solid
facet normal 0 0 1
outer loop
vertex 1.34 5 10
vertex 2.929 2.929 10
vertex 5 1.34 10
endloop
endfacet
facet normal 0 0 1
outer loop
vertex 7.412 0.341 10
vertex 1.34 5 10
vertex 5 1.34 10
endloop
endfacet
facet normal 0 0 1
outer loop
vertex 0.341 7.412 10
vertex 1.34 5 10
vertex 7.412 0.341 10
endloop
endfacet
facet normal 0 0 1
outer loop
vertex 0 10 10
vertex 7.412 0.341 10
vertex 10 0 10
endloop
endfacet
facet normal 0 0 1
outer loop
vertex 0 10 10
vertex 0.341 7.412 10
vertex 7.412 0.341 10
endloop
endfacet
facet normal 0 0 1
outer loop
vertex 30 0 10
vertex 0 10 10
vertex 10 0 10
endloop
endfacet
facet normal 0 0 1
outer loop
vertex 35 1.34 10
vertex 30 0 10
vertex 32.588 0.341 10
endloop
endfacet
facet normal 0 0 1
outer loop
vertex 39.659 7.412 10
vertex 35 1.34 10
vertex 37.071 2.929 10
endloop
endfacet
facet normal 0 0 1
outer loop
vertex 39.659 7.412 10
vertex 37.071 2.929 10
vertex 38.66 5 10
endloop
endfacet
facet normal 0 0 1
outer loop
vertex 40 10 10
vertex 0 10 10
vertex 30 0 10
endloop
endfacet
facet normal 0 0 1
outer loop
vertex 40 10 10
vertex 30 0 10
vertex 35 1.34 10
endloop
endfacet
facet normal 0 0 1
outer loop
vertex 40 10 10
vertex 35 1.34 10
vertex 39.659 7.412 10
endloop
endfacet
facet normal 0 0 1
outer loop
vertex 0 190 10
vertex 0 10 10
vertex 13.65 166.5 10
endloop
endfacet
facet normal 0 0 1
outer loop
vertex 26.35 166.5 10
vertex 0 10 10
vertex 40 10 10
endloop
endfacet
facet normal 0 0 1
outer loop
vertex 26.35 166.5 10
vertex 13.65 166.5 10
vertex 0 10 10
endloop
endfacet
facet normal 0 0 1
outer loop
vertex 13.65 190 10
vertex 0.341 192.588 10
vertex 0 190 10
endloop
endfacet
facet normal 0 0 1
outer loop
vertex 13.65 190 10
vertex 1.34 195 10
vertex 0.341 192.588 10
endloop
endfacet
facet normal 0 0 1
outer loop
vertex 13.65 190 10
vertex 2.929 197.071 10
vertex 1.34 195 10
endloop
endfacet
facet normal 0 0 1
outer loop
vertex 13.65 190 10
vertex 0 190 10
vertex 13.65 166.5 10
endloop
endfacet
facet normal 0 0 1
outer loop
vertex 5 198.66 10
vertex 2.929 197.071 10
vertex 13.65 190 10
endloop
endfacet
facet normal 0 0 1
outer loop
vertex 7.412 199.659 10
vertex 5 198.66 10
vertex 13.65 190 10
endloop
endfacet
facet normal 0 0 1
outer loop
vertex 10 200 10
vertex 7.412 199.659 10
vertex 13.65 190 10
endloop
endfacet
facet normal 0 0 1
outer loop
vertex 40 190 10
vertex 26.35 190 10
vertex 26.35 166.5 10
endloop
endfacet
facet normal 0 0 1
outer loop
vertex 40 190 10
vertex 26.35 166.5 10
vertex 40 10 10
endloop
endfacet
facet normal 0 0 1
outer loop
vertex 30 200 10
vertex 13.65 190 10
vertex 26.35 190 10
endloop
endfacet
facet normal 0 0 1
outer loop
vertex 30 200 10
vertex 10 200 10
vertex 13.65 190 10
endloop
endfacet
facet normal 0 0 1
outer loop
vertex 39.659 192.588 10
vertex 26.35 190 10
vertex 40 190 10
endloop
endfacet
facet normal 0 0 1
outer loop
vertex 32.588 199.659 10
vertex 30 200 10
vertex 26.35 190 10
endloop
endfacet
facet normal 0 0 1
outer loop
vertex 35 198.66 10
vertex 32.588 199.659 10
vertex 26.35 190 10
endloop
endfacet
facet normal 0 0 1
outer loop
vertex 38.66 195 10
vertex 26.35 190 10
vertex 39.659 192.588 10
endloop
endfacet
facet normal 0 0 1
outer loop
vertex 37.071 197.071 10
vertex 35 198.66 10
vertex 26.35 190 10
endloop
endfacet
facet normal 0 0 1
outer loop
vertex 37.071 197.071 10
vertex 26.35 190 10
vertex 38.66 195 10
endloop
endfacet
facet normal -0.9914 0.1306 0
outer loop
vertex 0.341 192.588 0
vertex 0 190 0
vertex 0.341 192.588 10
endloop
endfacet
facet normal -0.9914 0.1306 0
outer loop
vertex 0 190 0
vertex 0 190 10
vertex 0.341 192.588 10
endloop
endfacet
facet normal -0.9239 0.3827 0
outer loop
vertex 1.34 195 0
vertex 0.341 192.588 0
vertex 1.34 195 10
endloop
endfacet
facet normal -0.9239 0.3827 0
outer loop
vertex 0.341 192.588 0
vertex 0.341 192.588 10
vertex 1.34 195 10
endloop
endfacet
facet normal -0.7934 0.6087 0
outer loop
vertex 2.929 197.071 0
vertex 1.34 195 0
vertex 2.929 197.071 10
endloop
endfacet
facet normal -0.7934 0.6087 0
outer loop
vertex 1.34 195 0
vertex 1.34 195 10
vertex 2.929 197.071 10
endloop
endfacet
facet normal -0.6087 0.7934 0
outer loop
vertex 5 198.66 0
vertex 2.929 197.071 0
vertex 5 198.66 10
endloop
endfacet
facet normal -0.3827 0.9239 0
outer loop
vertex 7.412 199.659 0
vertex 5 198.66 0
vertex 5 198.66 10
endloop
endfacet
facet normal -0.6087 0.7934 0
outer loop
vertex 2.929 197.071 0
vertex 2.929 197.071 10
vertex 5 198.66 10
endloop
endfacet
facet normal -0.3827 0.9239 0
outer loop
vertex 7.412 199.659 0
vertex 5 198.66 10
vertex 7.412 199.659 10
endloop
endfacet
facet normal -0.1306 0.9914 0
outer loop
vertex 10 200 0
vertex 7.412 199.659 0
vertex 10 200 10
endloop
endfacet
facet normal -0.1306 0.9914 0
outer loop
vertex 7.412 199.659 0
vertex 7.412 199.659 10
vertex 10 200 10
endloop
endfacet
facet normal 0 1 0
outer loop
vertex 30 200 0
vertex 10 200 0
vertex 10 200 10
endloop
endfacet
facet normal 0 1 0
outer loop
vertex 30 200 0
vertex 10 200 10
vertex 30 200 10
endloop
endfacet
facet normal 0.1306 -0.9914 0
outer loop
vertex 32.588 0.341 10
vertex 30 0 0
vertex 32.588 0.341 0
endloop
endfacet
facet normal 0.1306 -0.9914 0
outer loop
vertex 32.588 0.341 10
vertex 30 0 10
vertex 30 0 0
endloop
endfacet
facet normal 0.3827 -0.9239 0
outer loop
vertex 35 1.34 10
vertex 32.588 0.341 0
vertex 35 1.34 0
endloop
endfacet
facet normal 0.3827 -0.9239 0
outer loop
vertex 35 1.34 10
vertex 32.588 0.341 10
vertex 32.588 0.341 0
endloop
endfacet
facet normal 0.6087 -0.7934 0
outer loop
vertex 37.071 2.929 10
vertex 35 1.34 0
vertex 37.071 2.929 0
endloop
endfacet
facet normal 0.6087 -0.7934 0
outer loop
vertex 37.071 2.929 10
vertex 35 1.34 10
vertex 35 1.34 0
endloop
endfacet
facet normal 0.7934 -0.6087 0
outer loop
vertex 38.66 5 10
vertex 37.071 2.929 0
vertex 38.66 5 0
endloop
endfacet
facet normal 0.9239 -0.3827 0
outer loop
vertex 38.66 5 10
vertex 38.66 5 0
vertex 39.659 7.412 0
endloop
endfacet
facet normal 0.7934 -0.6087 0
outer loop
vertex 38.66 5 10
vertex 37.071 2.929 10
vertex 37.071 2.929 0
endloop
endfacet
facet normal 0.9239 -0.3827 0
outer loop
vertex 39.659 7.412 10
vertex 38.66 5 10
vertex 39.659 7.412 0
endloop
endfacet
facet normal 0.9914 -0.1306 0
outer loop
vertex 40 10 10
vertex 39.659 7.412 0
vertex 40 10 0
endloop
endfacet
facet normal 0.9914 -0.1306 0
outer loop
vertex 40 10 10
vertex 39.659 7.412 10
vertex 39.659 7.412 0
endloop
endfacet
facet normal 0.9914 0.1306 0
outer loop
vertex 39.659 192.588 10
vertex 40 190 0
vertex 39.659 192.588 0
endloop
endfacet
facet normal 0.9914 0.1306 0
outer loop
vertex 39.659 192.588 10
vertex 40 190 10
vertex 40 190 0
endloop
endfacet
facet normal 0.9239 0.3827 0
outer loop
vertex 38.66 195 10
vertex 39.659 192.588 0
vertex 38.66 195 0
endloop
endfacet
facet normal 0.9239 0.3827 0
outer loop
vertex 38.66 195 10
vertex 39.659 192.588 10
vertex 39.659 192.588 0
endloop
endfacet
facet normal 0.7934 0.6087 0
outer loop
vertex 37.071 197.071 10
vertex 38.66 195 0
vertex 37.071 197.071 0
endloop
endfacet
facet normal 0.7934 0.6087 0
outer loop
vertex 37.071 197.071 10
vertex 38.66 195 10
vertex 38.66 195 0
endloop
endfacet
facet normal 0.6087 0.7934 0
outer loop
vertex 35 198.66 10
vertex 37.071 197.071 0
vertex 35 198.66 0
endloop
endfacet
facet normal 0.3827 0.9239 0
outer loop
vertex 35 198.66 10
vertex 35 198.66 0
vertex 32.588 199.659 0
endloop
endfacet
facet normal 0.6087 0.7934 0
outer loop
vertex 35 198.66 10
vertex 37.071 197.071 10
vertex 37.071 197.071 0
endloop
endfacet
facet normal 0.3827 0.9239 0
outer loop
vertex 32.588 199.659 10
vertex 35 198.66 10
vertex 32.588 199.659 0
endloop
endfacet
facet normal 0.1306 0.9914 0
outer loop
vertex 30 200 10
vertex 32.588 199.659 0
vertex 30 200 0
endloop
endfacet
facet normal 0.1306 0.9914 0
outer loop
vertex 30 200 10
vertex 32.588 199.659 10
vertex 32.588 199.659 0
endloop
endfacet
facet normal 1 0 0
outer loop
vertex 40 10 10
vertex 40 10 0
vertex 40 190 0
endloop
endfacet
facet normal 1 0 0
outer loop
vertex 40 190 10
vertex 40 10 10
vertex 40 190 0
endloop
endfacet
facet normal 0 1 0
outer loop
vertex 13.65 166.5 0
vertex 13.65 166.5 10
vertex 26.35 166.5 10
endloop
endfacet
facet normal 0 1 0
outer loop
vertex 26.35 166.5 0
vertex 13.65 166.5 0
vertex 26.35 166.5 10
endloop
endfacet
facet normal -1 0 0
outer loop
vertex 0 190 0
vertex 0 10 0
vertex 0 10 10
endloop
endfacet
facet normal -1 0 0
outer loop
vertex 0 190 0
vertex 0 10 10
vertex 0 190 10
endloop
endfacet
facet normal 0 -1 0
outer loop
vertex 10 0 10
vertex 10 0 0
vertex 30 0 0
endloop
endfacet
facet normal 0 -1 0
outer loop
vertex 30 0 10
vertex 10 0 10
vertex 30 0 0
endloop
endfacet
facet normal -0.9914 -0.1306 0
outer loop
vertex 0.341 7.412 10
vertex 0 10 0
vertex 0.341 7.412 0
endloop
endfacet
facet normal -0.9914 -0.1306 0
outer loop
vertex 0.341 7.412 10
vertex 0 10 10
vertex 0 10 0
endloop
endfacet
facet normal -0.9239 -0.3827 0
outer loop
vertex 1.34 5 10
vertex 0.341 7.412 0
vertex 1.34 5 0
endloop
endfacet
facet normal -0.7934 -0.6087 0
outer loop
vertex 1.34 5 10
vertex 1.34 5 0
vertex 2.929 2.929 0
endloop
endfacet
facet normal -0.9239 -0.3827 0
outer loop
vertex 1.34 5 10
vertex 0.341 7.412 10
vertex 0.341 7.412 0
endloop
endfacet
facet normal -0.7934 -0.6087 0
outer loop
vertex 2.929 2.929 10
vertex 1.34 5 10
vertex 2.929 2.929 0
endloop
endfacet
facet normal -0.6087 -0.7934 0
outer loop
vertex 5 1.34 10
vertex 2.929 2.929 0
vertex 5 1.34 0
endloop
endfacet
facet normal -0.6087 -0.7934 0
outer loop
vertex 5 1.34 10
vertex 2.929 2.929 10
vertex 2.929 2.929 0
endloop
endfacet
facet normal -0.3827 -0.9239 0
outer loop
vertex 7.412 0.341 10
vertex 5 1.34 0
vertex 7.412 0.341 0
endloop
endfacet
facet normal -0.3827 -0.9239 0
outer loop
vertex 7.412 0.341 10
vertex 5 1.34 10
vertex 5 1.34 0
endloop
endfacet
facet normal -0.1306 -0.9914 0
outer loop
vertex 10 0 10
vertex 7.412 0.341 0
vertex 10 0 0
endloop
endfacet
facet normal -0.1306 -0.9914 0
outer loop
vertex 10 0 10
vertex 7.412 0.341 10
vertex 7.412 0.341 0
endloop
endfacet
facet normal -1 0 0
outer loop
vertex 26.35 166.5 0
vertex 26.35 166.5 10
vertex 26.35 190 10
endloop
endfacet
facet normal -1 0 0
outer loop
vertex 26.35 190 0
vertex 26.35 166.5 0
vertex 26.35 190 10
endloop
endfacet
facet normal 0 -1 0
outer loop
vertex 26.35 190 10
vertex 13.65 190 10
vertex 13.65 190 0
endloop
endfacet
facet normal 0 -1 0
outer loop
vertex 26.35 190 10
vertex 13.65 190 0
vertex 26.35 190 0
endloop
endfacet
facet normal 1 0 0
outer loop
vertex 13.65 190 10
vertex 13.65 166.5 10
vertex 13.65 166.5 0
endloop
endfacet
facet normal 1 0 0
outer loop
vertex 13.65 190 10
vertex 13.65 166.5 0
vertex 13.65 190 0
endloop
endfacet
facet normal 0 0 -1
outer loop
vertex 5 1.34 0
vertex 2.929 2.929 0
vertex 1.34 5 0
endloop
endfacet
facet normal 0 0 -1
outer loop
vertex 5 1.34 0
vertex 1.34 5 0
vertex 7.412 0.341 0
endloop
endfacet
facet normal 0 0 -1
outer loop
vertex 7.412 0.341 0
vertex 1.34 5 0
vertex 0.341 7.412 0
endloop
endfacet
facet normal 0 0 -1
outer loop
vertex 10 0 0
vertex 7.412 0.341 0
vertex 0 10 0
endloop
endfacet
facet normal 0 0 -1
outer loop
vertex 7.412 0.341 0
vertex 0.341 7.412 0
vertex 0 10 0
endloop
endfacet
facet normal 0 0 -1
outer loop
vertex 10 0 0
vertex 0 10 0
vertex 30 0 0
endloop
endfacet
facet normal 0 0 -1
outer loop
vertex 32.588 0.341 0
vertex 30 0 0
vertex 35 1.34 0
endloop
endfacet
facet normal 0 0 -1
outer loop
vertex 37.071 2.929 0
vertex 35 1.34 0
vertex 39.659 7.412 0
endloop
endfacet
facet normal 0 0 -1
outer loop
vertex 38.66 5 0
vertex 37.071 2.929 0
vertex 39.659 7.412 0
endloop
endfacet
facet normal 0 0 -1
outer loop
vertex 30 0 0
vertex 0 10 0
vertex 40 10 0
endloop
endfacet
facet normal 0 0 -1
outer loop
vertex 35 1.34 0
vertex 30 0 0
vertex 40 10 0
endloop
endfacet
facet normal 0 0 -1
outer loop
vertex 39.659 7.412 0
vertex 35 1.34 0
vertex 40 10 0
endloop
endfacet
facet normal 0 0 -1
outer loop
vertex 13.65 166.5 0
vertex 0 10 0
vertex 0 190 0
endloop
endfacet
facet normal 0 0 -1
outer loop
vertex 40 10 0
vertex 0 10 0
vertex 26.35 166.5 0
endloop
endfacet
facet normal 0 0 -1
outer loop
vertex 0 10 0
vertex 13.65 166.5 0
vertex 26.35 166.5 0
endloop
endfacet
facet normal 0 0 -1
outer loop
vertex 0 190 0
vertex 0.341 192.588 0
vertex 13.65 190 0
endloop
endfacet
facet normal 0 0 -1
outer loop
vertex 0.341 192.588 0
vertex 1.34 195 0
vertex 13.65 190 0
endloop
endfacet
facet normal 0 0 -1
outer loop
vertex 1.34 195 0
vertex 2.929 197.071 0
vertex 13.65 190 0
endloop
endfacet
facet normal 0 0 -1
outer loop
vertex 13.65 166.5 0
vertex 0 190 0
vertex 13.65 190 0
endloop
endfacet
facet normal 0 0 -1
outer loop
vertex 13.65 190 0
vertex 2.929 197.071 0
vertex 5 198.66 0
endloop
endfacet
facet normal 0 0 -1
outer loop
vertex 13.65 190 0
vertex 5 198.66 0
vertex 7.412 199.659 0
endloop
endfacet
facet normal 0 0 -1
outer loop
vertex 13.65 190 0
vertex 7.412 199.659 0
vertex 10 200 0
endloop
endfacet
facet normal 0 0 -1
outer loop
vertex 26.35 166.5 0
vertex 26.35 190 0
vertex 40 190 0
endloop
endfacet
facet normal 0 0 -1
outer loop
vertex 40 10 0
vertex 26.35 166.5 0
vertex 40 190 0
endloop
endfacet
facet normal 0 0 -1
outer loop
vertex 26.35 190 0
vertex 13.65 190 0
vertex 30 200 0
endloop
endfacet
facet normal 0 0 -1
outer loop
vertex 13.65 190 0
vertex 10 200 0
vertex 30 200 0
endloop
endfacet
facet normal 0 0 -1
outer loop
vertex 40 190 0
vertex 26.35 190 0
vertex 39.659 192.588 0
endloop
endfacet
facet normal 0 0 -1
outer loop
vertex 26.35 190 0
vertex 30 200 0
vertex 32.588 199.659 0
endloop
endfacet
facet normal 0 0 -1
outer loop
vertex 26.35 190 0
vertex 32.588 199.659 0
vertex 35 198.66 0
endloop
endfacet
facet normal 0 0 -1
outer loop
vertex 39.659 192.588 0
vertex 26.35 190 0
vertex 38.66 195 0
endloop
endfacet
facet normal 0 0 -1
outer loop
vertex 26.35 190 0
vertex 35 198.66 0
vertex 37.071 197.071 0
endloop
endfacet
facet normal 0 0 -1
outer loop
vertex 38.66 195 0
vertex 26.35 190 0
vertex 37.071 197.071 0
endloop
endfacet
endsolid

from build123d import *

# Parameters (mm, degrees)
SKICA1_W                 = 40
SKICA1_H                 = 200
P_IDAT_VYSUNUT_M1_DEPTH  = 10
ZAOBLIT1_R               = 10
SKICA2_W                 = 12.7
SKICA2_H                 = 23.5
ODEBRAT_VYSUNUT_M1_DEPTH = 205.205778567


with BuildPart() as part:
    # Skica1 → Přidat vysunutím1 (new body)
    with BuildSketch(Plane.XY):
        with Locations((20, 100)):
            Rectangle(SKICA1_W, SKICA1_H)
    extrude(amount=P_IDAT_VYSUNUT_M1_DEPTH)

    # Zaoblit1
    zaoblit1_edges = [part.edges().sort_by_distance(p)[0] for p in [
        (0, 200, 5),
        (40, 200, 5),
        (40, 0, 5),
        (0, 0, 5),
    ]]
    fillet(zaoblit1_edges, radius=ZAOBLIT1_R)

    # Skica2 → Odebrat vysunutím1 (cut, through all)
    with BuildSketch(Plane.XY.offset(10)):
        with Locations((20, 178.25)):
            Rectangle(SKICA2_W, SKICA2_H)
    extrude(amount=-ODEBRAT_VYSUNUT_M1_DEPTH, mode=Mode.SUBTRACT)


solid = part.part
